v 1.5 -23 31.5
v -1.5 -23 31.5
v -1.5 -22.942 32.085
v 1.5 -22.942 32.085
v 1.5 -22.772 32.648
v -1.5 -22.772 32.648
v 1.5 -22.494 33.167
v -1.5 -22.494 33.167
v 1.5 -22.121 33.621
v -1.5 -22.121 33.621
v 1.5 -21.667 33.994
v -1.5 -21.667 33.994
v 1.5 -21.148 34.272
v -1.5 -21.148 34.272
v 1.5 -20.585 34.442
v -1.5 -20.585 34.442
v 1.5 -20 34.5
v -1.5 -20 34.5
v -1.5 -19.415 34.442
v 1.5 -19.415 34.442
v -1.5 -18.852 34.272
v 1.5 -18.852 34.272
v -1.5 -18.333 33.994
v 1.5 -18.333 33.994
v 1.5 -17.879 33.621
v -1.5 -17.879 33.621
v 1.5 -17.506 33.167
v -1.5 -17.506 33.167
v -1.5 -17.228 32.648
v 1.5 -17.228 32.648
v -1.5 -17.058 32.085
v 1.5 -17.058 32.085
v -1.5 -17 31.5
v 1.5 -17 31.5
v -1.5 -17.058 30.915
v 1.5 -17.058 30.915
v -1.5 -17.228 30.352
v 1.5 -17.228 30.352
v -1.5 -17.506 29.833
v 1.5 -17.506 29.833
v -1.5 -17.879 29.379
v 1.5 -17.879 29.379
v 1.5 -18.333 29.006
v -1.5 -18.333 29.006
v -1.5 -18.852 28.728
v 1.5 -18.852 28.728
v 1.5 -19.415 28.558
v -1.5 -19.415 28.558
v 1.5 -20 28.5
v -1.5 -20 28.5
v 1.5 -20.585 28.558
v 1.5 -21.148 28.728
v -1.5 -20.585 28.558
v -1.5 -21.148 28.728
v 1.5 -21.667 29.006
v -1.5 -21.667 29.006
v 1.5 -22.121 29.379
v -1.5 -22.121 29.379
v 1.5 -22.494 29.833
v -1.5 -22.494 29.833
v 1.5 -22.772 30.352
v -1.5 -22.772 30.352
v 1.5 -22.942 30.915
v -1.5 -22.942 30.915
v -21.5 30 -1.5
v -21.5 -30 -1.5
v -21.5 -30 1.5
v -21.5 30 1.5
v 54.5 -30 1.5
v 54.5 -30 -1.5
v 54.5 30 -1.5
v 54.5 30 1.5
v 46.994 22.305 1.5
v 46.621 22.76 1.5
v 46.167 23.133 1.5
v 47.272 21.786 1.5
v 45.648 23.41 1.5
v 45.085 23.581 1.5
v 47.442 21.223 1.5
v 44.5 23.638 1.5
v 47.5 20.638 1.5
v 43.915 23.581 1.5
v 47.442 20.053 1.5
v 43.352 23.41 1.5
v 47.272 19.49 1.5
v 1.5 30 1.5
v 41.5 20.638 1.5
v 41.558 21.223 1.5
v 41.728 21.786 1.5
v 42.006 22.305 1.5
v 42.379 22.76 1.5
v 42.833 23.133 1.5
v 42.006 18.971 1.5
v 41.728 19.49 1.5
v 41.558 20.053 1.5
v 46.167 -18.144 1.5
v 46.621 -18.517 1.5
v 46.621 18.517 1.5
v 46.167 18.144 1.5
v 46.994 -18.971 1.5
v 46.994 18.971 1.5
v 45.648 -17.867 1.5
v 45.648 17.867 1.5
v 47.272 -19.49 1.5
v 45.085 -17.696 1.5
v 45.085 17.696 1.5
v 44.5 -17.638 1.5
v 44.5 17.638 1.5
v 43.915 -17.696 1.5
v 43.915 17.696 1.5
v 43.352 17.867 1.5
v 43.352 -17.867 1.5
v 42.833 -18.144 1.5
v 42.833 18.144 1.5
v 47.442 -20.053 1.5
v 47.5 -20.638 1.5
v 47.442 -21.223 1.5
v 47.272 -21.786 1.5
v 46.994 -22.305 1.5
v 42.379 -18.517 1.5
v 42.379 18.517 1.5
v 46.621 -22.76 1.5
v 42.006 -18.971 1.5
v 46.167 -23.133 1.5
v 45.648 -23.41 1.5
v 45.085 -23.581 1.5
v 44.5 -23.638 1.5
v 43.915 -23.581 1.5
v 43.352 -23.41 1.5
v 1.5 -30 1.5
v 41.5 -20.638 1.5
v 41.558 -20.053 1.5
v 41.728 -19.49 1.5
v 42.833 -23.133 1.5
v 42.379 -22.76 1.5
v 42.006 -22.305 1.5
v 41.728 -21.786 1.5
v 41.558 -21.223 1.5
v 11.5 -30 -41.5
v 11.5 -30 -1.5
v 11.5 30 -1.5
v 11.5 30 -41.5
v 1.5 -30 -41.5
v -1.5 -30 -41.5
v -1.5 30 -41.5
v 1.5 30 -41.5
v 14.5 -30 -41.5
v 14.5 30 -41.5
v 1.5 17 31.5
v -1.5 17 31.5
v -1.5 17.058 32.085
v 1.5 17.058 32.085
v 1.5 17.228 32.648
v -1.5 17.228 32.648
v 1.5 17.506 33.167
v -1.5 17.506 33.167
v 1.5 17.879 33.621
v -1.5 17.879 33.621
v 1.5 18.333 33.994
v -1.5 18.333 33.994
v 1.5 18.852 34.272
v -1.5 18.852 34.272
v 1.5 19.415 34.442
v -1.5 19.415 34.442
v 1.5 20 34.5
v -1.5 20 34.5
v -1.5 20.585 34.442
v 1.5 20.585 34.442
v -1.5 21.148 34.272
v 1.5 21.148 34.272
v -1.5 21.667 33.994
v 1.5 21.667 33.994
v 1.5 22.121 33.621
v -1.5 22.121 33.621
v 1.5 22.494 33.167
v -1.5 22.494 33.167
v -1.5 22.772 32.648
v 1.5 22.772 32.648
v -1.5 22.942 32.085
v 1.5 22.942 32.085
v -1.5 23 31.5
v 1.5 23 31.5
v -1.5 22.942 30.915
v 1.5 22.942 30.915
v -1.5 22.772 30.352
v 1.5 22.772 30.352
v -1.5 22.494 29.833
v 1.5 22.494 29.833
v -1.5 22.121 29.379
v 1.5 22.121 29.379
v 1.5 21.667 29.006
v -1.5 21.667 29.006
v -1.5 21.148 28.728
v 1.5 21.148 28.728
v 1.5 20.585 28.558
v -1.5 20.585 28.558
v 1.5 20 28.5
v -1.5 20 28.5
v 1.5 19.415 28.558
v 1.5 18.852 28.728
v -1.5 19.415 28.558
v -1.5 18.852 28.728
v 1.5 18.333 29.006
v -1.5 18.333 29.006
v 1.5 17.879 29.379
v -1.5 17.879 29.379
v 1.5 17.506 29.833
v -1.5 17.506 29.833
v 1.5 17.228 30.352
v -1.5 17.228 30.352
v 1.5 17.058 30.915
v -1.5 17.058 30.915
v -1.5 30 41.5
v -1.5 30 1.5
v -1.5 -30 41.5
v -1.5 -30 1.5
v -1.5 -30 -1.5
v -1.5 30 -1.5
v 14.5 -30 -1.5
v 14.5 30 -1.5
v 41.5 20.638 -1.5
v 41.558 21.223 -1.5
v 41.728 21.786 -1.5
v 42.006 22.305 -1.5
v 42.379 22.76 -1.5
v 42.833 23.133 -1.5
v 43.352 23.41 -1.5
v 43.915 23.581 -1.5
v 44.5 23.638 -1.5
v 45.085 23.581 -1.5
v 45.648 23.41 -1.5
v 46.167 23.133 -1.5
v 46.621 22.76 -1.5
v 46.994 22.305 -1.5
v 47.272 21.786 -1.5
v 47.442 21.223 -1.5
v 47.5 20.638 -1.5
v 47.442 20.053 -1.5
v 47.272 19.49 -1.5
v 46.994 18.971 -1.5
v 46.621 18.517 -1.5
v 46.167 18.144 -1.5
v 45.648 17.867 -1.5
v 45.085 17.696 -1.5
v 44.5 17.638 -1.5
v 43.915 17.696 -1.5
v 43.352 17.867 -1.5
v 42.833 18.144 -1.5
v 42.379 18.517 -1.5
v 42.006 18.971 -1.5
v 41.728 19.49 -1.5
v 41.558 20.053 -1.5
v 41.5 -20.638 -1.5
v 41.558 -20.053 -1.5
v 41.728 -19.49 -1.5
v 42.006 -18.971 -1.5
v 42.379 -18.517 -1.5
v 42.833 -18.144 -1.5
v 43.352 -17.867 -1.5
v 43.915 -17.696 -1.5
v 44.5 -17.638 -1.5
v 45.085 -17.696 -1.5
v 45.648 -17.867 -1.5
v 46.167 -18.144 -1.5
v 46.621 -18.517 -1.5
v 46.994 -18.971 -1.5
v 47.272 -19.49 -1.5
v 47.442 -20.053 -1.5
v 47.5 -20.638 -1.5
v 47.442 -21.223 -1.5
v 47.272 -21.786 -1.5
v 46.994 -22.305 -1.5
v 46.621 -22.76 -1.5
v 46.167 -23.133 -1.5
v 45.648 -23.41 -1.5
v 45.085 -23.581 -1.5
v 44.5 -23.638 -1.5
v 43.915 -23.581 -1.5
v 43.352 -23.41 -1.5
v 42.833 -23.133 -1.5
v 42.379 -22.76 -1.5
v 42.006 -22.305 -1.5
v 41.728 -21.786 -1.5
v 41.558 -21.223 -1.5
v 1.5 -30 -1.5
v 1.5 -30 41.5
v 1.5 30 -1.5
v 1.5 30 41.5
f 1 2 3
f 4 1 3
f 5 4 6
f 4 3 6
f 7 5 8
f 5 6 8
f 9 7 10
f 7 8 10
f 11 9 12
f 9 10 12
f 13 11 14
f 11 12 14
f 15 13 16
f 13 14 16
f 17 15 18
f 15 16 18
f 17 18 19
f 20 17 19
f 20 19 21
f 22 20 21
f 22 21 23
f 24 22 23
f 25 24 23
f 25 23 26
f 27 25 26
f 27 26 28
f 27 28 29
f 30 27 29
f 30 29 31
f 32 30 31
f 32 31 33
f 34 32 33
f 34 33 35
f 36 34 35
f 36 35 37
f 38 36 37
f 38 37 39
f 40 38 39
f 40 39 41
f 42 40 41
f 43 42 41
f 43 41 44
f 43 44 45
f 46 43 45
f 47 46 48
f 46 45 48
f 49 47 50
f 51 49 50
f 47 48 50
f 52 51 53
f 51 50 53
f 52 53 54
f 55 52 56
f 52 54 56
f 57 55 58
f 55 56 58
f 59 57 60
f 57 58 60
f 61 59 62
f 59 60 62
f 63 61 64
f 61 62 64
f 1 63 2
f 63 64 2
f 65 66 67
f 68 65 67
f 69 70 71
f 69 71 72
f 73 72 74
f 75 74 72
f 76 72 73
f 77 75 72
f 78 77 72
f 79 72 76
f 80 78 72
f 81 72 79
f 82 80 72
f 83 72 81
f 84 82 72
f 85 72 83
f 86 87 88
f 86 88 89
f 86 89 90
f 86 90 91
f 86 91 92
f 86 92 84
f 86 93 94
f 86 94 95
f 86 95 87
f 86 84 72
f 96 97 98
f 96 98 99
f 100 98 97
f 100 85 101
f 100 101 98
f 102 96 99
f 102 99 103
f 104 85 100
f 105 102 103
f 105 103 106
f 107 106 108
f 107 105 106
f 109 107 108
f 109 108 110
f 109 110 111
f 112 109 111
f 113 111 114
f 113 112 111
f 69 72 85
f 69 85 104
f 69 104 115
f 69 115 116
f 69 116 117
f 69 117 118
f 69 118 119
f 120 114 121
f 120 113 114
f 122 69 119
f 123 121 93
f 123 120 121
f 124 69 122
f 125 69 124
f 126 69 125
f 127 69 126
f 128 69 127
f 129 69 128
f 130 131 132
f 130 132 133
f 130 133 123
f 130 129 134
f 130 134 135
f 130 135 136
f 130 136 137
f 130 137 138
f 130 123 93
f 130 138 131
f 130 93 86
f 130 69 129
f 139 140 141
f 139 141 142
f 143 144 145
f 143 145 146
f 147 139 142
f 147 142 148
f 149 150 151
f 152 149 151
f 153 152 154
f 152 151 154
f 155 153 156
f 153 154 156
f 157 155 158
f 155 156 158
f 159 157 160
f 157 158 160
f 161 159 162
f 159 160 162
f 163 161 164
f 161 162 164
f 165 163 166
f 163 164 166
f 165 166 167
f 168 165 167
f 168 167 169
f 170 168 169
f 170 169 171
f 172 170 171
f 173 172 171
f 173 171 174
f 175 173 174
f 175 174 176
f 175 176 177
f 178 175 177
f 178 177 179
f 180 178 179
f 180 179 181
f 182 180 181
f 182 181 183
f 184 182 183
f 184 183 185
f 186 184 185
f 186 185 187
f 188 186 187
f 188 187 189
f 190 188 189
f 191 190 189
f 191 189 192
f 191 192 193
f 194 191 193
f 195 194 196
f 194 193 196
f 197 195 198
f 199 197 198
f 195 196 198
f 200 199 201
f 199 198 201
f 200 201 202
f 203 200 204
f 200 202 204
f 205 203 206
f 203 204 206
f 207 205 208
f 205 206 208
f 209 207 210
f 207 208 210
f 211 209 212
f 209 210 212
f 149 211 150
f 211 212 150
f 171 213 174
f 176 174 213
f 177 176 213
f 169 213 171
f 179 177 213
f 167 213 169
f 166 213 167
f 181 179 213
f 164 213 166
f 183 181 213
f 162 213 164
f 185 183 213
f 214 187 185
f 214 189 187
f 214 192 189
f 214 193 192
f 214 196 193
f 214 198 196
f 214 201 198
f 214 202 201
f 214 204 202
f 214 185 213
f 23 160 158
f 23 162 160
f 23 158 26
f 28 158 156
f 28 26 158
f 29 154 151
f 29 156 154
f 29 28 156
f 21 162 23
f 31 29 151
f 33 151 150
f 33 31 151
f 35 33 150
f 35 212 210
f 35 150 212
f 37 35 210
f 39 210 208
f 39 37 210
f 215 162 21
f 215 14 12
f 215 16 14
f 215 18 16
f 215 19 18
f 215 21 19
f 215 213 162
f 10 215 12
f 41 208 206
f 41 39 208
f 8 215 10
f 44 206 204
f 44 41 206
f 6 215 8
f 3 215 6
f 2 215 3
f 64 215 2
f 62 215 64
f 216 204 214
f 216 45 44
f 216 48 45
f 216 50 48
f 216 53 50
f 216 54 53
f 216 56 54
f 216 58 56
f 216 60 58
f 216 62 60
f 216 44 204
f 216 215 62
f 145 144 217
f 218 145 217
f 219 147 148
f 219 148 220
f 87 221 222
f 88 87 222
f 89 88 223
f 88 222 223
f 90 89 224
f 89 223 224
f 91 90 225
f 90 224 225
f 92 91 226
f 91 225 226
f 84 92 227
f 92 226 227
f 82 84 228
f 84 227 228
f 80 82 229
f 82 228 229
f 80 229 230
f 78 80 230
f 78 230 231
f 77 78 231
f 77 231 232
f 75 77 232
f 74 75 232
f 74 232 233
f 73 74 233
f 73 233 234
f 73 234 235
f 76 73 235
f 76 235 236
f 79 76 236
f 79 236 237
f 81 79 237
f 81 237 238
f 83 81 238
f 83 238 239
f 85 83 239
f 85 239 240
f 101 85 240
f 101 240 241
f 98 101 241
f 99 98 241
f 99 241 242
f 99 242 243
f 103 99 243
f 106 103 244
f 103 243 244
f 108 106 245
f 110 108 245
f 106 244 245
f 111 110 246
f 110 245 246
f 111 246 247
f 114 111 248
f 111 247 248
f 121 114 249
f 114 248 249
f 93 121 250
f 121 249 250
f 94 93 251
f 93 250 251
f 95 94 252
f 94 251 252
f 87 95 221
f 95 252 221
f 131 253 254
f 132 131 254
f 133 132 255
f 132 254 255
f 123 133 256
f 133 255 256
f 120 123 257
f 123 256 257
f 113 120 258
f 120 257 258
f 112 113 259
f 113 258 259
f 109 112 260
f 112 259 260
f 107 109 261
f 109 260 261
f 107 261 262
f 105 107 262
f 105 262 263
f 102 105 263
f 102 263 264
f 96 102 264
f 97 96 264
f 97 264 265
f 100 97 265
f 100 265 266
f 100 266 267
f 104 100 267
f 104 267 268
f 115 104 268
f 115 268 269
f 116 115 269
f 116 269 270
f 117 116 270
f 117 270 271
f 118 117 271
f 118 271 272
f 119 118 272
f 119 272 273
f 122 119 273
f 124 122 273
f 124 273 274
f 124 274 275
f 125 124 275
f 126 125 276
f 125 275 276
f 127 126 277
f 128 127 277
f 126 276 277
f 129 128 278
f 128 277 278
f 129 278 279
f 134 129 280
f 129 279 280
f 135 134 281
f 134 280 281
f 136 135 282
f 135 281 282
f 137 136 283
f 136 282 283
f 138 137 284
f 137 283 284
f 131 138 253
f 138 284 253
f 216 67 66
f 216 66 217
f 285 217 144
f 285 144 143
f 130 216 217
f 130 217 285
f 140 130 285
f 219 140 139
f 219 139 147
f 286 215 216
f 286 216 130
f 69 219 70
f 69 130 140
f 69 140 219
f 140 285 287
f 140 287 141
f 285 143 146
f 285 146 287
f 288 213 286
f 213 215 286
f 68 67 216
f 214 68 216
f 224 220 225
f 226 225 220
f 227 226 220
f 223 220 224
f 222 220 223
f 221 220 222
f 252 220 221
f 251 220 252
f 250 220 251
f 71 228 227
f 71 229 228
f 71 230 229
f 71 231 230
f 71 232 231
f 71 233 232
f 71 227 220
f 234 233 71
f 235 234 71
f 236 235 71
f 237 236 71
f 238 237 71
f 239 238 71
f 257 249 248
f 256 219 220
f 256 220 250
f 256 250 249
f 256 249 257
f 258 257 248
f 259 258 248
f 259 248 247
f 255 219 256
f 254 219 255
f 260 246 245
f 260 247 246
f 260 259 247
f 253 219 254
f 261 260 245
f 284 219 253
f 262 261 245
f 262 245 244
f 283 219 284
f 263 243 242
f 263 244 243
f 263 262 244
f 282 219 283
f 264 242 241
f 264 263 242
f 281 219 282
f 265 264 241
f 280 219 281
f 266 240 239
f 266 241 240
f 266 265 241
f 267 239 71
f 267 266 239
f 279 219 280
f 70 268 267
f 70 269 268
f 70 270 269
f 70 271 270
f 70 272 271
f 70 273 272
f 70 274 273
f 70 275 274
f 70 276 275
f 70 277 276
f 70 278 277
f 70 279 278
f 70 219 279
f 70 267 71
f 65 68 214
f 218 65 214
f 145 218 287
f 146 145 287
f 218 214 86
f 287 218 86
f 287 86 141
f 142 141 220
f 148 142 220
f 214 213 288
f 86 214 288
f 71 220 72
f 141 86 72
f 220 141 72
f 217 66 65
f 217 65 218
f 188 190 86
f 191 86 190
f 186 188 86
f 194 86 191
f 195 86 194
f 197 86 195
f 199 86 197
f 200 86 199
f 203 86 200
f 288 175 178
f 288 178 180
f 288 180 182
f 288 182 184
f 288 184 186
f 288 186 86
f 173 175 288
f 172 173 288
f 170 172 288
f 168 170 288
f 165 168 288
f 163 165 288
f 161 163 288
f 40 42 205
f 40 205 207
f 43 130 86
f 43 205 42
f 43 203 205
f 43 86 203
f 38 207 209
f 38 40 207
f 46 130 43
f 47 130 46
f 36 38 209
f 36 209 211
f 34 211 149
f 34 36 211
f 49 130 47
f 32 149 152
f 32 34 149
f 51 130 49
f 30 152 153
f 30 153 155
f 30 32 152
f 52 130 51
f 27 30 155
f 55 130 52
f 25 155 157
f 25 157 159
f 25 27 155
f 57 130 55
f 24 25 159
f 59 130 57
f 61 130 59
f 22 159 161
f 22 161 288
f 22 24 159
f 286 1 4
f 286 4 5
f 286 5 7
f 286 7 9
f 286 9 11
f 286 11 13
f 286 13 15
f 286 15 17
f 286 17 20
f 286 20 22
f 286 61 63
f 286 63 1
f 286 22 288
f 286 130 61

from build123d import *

# Parameters (mm, degrees)
F0_W          = 3
F0_H          = 40
F0_H_2        = 3
F0_W_2        = 20
F0_W_3        = 10
F0_W_4        = 7
F0_W_5        = 33
F1_DEPTH      = 30
F1_DEPTH_BACK = 30
F3_D          = 6
F3_DEPTH      = 12
F3_TIP        = 1.8025818571
F5_D          = 6
F5_DEPTH      = 12
F5_TIP        = 1.8025818571


with BuildPart() as f1:
    # F0 (on Front) → F1 (new body, two sides)
    with BuildSketch(Plane.XZ) as f1_sk:
        with Locations((0, 21.5)):
            Rectangle(F0_W, F0_H)
        Rectangle(F0_W, F0_H_2)
        with Locations((-11.5, 0)):
            Rectangle(F0_W_2, F0_H_2)
        with Locations((6.5, 0)):
            Rectangle(F0_W_3, F0_H_2)
        with Locations((0, -21.5)):
            Rectangle(F0_W, F0_H)
        with Locations((13, 0)):
            Rectangle(F0_W, F0_H_2)
        Polygon((14.5, -1.5), (11.5, -1.5), (11.5, -8.7749995426), (11.5, -41.5), (14.5, -41.5), (14.5, -8.7749995426), align=None)
        with Locations((18, 0)):
            Rectangle(F0_W_4, F0_H_2)
        with Locations((38, 0)):
            Rectangle(F0_W_5, F0_H_2)
    extrude(amount=F1_DEPTH)
    extrude(f1_sk.sketch, amount=-F1_DEPTH_BACK)

    # F3
    with Locations(Plane.YZ.offset(1.5)):
        with Locations((-20, 31.5), (20, 31.5)):
            Hole(F3_D / 2, depth=F3_DEPTH)
            with Locations((0, 0, -(F3_DEPTH + F3_TIP / 2))):  # 118° drill point
                Cone(0, F3_D / 2, F3_TIP, mode=Mode.SUBTRACT)

    # F5
    with Locations(Plane.XY.offset(1.5)):
        with Locations((44.5, 20.6381995231), (44.5, -20.6381995231)):
            Hole(F5_D / 2, depth=F5_DEPTH)
            with Locations((0, 0, -(F5_DEPTH + F5_TIP / 2))):  # 118° drill point
                Cone(0, F5_D / 2, F5_TIP, mode=Mode.SUBTRACT)


solid = f1.part
